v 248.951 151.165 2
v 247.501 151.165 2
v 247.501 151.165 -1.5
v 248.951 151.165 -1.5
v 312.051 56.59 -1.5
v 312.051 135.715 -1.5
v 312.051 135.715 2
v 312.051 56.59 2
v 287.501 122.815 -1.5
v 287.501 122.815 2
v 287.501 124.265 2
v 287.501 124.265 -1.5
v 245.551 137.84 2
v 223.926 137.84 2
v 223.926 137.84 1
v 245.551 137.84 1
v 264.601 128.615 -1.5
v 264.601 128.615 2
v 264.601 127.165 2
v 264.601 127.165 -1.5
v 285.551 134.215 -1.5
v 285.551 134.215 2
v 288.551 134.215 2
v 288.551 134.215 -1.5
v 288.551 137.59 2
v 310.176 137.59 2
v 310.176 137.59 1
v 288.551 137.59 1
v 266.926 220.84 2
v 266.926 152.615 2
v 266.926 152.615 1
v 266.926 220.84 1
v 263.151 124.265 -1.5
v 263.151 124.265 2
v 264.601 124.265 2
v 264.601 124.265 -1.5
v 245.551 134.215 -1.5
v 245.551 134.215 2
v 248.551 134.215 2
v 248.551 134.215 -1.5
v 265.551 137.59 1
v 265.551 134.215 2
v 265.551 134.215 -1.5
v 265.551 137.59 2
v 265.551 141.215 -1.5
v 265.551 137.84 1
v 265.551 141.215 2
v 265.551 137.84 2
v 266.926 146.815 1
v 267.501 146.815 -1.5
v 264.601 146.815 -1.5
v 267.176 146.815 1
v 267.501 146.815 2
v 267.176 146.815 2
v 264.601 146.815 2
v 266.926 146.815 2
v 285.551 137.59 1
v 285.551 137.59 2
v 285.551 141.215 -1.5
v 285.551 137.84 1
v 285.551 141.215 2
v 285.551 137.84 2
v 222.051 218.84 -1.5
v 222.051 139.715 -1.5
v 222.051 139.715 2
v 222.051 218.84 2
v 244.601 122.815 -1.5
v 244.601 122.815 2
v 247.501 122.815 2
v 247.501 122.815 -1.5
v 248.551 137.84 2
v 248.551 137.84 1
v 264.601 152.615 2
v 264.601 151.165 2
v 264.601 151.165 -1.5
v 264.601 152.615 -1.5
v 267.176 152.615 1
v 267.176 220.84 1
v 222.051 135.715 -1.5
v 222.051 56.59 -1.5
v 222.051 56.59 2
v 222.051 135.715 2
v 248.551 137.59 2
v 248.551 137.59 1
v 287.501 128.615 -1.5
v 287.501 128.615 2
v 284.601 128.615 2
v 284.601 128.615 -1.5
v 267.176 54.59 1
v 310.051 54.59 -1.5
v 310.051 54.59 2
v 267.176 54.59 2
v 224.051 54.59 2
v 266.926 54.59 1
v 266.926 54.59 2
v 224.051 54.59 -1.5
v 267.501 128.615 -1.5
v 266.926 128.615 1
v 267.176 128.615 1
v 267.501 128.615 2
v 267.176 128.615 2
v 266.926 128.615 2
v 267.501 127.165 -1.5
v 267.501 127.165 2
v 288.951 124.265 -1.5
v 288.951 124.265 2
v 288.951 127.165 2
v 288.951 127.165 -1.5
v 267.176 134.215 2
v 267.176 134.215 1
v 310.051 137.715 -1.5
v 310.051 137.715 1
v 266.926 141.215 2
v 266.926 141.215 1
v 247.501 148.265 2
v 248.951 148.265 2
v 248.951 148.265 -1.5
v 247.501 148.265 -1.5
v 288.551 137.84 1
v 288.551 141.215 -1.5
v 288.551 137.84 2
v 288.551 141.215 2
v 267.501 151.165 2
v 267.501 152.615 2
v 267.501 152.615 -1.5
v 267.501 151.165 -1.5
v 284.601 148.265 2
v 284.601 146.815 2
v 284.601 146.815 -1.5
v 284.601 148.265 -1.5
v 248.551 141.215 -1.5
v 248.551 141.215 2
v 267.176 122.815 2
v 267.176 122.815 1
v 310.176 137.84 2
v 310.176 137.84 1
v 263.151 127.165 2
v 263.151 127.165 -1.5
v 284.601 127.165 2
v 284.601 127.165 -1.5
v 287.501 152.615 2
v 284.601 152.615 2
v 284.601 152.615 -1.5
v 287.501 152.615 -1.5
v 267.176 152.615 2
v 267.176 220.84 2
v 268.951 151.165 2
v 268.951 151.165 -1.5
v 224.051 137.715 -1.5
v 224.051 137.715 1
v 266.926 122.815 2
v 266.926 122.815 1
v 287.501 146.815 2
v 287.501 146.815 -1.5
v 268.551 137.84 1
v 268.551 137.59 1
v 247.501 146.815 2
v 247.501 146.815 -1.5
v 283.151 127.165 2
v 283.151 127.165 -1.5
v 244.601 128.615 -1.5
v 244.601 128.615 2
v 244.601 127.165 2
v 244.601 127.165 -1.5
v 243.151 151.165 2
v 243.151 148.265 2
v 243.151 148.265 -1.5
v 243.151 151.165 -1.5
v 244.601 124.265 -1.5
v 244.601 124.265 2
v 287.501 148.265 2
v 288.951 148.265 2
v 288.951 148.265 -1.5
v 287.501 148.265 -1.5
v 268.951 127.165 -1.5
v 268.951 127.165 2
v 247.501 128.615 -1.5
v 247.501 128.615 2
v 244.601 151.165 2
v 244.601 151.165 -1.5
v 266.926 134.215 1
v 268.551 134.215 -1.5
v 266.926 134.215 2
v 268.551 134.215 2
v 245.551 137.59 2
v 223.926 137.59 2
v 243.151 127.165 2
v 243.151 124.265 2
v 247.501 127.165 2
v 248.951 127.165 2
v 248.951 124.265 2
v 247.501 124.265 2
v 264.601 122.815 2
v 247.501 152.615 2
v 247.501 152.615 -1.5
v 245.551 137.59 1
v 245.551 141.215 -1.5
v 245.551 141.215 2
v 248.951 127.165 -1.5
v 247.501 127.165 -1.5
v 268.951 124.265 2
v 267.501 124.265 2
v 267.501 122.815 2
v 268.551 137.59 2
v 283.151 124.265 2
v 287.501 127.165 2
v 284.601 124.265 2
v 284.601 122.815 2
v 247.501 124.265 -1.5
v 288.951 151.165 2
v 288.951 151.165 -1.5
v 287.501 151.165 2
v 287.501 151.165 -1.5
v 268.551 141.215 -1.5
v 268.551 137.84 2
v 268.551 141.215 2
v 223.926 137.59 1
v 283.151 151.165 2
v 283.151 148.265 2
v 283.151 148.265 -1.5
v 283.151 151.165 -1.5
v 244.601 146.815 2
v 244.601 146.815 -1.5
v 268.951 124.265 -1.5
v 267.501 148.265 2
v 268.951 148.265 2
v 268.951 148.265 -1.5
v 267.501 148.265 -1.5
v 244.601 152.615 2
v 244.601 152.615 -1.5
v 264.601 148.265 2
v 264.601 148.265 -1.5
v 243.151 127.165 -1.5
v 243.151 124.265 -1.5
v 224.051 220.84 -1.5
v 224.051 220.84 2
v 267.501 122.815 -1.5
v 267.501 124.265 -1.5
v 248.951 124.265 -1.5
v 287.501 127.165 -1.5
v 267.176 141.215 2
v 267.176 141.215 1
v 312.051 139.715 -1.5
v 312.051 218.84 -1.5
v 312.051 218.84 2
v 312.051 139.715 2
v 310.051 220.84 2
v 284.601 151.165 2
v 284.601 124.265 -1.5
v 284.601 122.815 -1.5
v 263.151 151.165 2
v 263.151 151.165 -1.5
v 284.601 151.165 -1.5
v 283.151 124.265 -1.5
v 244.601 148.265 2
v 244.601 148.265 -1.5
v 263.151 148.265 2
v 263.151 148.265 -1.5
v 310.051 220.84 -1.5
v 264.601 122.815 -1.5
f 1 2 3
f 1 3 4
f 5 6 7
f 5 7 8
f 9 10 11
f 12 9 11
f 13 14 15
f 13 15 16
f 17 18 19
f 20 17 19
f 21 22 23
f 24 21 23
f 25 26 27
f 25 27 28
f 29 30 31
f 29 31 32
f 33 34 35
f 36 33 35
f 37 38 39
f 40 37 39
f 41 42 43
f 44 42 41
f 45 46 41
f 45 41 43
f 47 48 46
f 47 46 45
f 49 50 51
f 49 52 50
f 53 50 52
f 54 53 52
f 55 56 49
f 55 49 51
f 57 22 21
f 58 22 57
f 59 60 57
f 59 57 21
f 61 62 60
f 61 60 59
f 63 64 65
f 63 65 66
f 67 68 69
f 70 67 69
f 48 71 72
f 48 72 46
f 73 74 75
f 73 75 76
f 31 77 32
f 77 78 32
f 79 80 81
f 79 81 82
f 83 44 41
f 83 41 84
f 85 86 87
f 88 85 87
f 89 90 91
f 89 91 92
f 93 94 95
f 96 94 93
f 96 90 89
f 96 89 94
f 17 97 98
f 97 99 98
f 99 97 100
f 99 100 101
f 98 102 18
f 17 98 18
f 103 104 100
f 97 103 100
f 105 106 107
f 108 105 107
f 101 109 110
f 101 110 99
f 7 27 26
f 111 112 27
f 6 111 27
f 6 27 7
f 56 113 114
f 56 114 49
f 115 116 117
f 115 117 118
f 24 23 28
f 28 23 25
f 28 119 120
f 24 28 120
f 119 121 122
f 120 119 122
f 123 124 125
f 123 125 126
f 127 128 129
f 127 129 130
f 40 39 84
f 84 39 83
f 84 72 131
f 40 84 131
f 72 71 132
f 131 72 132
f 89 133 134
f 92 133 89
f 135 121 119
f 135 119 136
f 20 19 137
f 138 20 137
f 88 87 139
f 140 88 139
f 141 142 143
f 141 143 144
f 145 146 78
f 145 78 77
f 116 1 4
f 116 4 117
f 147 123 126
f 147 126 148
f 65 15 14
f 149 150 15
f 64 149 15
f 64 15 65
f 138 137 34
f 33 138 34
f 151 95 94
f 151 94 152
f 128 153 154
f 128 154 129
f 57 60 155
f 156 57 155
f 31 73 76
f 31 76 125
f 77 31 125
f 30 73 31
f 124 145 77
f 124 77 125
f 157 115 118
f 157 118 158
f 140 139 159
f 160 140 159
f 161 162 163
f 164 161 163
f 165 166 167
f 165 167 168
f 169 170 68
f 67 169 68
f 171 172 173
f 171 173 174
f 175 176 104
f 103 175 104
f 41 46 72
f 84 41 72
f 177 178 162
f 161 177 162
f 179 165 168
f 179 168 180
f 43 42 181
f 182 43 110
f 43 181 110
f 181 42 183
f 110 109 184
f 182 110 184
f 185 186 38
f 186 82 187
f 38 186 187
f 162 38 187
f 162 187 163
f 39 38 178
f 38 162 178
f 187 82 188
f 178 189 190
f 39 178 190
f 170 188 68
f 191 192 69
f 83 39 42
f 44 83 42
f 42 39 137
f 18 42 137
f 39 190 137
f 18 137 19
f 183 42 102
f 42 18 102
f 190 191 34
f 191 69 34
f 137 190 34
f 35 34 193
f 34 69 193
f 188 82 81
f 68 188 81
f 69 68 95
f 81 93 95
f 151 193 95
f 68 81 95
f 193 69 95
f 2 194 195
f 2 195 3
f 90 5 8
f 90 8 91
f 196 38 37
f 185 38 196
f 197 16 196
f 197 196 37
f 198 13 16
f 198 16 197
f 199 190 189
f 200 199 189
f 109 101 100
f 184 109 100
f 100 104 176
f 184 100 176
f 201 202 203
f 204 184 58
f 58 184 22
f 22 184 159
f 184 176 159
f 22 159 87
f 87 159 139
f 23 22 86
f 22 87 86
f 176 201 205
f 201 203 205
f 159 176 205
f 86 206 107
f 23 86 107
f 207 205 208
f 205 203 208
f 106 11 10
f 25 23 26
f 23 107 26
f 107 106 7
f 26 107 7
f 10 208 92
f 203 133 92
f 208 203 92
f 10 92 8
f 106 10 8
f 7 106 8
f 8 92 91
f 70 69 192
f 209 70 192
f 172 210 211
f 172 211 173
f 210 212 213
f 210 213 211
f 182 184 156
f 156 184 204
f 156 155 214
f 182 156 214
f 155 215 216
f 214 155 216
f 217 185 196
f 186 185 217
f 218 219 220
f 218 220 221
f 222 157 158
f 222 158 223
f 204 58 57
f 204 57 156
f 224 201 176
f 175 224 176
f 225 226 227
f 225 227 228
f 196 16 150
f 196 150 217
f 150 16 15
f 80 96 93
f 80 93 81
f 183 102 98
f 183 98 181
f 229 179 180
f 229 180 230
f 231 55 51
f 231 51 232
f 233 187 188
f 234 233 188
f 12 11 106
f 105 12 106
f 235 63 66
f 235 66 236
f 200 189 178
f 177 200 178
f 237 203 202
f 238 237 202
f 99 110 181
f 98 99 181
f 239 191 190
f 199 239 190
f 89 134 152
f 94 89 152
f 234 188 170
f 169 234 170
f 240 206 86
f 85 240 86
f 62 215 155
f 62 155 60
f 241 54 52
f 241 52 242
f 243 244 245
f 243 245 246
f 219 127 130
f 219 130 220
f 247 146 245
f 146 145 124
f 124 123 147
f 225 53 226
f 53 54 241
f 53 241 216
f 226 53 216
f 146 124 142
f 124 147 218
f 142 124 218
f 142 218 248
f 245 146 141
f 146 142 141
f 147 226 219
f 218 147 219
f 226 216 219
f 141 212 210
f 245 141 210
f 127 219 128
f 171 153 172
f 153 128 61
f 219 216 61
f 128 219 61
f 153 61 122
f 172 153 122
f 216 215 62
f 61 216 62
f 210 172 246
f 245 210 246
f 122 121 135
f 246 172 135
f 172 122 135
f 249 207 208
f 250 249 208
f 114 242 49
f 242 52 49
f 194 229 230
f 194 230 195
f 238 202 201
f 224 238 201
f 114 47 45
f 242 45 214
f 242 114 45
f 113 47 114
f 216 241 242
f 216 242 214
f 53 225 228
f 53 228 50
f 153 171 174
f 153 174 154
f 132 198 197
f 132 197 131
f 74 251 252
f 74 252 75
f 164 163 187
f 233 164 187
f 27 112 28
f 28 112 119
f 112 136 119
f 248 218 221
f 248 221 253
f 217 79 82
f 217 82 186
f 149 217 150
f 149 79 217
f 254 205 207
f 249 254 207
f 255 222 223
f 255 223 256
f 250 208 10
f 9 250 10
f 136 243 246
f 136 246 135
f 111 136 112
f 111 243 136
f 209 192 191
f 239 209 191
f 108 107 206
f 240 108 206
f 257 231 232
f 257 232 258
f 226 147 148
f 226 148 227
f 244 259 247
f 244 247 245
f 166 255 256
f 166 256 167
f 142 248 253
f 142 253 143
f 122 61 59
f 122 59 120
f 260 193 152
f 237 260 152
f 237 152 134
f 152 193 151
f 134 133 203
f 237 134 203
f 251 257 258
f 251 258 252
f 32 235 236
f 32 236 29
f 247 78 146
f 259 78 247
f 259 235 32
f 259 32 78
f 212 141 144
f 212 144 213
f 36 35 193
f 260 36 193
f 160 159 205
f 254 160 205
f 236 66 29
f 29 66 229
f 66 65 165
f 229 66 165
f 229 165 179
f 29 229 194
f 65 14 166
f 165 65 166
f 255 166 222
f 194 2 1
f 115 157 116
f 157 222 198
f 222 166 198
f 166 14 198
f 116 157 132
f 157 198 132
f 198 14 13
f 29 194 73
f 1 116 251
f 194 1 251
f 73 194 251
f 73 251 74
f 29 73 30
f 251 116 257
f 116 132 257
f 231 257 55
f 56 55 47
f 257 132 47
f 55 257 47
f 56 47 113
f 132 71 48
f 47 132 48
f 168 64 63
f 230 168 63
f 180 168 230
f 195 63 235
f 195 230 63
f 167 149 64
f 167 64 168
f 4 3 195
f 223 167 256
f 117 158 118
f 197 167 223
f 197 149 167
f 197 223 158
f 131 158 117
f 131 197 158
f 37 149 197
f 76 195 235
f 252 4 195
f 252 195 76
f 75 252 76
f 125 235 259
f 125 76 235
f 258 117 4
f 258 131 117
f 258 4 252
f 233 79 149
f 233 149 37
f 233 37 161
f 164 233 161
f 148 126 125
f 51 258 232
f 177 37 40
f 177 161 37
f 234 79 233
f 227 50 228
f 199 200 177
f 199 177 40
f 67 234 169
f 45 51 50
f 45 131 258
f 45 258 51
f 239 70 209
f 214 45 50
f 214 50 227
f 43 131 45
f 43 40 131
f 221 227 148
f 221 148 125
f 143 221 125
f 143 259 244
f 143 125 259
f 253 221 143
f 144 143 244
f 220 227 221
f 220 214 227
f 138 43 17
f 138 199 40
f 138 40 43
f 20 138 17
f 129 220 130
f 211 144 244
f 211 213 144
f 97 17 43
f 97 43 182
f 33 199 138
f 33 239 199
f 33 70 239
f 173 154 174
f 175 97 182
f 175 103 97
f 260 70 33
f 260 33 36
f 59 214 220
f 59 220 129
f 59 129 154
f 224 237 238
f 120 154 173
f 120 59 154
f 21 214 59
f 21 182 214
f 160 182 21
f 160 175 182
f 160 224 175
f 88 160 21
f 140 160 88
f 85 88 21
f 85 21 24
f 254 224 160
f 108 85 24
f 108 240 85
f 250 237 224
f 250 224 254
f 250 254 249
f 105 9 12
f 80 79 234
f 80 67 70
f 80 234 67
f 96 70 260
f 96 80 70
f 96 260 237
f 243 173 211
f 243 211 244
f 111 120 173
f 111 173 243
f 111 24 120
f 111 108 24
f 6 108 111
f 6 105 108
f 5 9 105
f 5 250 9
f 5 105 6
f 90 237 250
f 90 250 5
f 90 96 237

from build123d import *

# Parameters (mm, degrees)
PAD011_DEPTH           = 3.5
POCKET_DEPTH           = 1
SKETCH_W               = 3
SKETCH_H               = 7
POCKET024_DEPTH        = 3.501
LINEARPATTERN001_COUNT = 3
LINEARPATTERN001_PITCH = 20


with BuildPart() as part:
    # Sketch030 (on Face1 of Binder) → Pad011 (new body)
    with BuildSketch(Plane(origin=(0, 0, -1.5), x_dir=(1, 0, 0), z_dir=(0, 0, -1))):
        Polygon((17.648, -218.84), (19.648, -220.84), (105.648, -220.84), (107.648, -218.84), (107.648, -139.715), (105.648, -137.715), (107.648, -135.715), (107.648, -56.59), (105.648, -54.59), (19.648, -54.59), (17.648, -56.59), (17.648, -135.715), (19.648, -137.715), (17.648, -139.715), align=None)
    extrude(amount=-PAD011_DEPTH)

    # Sketch034 (on Face4 of Pad011) → Pocket (cut)
    with BuildSketch(Plane.XY.offset(2)):
        Polygon((19.523, 137.84), (62.523, 137.84), (62.523, 220.84), (62.773, 220.84), (62.773, 137.84), (105.773, 137.84), (105.773, 137.59), (62.773, 137.59), (62.773, 54.59), (62.523, 54.59), (62.523, 137.59), (19.523, 137.59), align=None)
    extrude(amount=-POCKET_DEPTH, mode=Mode.SUBTRACT)

    # Sketch (on Face4 of Clone001) → Pocket024 (cut, through all)
    with BuildSketch(Plane.XY.offset(2)):
        with Locations((42.648, 137.715)):
            Rectangle(SKETCH_W, SKETCH_H)
        Polygon((40.198, 152.615), (43.098, 152.615), (43.098, 151.165), (44.548, 151.165), (44.548, 148.265), (43.098, 148.265), (43.098, 146.815), (40.198, 146.815), (40.198, 148.265), (38.748, 148.265), (38.748, 151.165), (40.198, 151.165), align=None)
        Polygon((40.198, 122.815), (43.098, 122.815), (43.098, 124.265), (44.548, 124.265), (44.548, 127.165), (43.098, 127.165), (43.098, 128.615), (40.198, 128.615), (40.198, 127.165), (38.748, 127.165), (38.748, 124.265), (40.198, 124.265), align=None)
    pocket024 = extrude(amount=-POCKET024_DEPTH, mode=Mode.SUBTRACT)

    # LinearPattern001: Pocket024 ×3
    with Locations(*[(i * LINEARPATTERN001_PITCH, 0, 0) for i in range(1, LINEARPATTERN001_COUNT)]):
        add(pocket024, mode=Mode.SUBTRACT)


with BuildPart() as part_1:
    # Body010 placement: moved
    add(part.part.moved(Location((204.403, 0, 0))))


solid = part_1.part
